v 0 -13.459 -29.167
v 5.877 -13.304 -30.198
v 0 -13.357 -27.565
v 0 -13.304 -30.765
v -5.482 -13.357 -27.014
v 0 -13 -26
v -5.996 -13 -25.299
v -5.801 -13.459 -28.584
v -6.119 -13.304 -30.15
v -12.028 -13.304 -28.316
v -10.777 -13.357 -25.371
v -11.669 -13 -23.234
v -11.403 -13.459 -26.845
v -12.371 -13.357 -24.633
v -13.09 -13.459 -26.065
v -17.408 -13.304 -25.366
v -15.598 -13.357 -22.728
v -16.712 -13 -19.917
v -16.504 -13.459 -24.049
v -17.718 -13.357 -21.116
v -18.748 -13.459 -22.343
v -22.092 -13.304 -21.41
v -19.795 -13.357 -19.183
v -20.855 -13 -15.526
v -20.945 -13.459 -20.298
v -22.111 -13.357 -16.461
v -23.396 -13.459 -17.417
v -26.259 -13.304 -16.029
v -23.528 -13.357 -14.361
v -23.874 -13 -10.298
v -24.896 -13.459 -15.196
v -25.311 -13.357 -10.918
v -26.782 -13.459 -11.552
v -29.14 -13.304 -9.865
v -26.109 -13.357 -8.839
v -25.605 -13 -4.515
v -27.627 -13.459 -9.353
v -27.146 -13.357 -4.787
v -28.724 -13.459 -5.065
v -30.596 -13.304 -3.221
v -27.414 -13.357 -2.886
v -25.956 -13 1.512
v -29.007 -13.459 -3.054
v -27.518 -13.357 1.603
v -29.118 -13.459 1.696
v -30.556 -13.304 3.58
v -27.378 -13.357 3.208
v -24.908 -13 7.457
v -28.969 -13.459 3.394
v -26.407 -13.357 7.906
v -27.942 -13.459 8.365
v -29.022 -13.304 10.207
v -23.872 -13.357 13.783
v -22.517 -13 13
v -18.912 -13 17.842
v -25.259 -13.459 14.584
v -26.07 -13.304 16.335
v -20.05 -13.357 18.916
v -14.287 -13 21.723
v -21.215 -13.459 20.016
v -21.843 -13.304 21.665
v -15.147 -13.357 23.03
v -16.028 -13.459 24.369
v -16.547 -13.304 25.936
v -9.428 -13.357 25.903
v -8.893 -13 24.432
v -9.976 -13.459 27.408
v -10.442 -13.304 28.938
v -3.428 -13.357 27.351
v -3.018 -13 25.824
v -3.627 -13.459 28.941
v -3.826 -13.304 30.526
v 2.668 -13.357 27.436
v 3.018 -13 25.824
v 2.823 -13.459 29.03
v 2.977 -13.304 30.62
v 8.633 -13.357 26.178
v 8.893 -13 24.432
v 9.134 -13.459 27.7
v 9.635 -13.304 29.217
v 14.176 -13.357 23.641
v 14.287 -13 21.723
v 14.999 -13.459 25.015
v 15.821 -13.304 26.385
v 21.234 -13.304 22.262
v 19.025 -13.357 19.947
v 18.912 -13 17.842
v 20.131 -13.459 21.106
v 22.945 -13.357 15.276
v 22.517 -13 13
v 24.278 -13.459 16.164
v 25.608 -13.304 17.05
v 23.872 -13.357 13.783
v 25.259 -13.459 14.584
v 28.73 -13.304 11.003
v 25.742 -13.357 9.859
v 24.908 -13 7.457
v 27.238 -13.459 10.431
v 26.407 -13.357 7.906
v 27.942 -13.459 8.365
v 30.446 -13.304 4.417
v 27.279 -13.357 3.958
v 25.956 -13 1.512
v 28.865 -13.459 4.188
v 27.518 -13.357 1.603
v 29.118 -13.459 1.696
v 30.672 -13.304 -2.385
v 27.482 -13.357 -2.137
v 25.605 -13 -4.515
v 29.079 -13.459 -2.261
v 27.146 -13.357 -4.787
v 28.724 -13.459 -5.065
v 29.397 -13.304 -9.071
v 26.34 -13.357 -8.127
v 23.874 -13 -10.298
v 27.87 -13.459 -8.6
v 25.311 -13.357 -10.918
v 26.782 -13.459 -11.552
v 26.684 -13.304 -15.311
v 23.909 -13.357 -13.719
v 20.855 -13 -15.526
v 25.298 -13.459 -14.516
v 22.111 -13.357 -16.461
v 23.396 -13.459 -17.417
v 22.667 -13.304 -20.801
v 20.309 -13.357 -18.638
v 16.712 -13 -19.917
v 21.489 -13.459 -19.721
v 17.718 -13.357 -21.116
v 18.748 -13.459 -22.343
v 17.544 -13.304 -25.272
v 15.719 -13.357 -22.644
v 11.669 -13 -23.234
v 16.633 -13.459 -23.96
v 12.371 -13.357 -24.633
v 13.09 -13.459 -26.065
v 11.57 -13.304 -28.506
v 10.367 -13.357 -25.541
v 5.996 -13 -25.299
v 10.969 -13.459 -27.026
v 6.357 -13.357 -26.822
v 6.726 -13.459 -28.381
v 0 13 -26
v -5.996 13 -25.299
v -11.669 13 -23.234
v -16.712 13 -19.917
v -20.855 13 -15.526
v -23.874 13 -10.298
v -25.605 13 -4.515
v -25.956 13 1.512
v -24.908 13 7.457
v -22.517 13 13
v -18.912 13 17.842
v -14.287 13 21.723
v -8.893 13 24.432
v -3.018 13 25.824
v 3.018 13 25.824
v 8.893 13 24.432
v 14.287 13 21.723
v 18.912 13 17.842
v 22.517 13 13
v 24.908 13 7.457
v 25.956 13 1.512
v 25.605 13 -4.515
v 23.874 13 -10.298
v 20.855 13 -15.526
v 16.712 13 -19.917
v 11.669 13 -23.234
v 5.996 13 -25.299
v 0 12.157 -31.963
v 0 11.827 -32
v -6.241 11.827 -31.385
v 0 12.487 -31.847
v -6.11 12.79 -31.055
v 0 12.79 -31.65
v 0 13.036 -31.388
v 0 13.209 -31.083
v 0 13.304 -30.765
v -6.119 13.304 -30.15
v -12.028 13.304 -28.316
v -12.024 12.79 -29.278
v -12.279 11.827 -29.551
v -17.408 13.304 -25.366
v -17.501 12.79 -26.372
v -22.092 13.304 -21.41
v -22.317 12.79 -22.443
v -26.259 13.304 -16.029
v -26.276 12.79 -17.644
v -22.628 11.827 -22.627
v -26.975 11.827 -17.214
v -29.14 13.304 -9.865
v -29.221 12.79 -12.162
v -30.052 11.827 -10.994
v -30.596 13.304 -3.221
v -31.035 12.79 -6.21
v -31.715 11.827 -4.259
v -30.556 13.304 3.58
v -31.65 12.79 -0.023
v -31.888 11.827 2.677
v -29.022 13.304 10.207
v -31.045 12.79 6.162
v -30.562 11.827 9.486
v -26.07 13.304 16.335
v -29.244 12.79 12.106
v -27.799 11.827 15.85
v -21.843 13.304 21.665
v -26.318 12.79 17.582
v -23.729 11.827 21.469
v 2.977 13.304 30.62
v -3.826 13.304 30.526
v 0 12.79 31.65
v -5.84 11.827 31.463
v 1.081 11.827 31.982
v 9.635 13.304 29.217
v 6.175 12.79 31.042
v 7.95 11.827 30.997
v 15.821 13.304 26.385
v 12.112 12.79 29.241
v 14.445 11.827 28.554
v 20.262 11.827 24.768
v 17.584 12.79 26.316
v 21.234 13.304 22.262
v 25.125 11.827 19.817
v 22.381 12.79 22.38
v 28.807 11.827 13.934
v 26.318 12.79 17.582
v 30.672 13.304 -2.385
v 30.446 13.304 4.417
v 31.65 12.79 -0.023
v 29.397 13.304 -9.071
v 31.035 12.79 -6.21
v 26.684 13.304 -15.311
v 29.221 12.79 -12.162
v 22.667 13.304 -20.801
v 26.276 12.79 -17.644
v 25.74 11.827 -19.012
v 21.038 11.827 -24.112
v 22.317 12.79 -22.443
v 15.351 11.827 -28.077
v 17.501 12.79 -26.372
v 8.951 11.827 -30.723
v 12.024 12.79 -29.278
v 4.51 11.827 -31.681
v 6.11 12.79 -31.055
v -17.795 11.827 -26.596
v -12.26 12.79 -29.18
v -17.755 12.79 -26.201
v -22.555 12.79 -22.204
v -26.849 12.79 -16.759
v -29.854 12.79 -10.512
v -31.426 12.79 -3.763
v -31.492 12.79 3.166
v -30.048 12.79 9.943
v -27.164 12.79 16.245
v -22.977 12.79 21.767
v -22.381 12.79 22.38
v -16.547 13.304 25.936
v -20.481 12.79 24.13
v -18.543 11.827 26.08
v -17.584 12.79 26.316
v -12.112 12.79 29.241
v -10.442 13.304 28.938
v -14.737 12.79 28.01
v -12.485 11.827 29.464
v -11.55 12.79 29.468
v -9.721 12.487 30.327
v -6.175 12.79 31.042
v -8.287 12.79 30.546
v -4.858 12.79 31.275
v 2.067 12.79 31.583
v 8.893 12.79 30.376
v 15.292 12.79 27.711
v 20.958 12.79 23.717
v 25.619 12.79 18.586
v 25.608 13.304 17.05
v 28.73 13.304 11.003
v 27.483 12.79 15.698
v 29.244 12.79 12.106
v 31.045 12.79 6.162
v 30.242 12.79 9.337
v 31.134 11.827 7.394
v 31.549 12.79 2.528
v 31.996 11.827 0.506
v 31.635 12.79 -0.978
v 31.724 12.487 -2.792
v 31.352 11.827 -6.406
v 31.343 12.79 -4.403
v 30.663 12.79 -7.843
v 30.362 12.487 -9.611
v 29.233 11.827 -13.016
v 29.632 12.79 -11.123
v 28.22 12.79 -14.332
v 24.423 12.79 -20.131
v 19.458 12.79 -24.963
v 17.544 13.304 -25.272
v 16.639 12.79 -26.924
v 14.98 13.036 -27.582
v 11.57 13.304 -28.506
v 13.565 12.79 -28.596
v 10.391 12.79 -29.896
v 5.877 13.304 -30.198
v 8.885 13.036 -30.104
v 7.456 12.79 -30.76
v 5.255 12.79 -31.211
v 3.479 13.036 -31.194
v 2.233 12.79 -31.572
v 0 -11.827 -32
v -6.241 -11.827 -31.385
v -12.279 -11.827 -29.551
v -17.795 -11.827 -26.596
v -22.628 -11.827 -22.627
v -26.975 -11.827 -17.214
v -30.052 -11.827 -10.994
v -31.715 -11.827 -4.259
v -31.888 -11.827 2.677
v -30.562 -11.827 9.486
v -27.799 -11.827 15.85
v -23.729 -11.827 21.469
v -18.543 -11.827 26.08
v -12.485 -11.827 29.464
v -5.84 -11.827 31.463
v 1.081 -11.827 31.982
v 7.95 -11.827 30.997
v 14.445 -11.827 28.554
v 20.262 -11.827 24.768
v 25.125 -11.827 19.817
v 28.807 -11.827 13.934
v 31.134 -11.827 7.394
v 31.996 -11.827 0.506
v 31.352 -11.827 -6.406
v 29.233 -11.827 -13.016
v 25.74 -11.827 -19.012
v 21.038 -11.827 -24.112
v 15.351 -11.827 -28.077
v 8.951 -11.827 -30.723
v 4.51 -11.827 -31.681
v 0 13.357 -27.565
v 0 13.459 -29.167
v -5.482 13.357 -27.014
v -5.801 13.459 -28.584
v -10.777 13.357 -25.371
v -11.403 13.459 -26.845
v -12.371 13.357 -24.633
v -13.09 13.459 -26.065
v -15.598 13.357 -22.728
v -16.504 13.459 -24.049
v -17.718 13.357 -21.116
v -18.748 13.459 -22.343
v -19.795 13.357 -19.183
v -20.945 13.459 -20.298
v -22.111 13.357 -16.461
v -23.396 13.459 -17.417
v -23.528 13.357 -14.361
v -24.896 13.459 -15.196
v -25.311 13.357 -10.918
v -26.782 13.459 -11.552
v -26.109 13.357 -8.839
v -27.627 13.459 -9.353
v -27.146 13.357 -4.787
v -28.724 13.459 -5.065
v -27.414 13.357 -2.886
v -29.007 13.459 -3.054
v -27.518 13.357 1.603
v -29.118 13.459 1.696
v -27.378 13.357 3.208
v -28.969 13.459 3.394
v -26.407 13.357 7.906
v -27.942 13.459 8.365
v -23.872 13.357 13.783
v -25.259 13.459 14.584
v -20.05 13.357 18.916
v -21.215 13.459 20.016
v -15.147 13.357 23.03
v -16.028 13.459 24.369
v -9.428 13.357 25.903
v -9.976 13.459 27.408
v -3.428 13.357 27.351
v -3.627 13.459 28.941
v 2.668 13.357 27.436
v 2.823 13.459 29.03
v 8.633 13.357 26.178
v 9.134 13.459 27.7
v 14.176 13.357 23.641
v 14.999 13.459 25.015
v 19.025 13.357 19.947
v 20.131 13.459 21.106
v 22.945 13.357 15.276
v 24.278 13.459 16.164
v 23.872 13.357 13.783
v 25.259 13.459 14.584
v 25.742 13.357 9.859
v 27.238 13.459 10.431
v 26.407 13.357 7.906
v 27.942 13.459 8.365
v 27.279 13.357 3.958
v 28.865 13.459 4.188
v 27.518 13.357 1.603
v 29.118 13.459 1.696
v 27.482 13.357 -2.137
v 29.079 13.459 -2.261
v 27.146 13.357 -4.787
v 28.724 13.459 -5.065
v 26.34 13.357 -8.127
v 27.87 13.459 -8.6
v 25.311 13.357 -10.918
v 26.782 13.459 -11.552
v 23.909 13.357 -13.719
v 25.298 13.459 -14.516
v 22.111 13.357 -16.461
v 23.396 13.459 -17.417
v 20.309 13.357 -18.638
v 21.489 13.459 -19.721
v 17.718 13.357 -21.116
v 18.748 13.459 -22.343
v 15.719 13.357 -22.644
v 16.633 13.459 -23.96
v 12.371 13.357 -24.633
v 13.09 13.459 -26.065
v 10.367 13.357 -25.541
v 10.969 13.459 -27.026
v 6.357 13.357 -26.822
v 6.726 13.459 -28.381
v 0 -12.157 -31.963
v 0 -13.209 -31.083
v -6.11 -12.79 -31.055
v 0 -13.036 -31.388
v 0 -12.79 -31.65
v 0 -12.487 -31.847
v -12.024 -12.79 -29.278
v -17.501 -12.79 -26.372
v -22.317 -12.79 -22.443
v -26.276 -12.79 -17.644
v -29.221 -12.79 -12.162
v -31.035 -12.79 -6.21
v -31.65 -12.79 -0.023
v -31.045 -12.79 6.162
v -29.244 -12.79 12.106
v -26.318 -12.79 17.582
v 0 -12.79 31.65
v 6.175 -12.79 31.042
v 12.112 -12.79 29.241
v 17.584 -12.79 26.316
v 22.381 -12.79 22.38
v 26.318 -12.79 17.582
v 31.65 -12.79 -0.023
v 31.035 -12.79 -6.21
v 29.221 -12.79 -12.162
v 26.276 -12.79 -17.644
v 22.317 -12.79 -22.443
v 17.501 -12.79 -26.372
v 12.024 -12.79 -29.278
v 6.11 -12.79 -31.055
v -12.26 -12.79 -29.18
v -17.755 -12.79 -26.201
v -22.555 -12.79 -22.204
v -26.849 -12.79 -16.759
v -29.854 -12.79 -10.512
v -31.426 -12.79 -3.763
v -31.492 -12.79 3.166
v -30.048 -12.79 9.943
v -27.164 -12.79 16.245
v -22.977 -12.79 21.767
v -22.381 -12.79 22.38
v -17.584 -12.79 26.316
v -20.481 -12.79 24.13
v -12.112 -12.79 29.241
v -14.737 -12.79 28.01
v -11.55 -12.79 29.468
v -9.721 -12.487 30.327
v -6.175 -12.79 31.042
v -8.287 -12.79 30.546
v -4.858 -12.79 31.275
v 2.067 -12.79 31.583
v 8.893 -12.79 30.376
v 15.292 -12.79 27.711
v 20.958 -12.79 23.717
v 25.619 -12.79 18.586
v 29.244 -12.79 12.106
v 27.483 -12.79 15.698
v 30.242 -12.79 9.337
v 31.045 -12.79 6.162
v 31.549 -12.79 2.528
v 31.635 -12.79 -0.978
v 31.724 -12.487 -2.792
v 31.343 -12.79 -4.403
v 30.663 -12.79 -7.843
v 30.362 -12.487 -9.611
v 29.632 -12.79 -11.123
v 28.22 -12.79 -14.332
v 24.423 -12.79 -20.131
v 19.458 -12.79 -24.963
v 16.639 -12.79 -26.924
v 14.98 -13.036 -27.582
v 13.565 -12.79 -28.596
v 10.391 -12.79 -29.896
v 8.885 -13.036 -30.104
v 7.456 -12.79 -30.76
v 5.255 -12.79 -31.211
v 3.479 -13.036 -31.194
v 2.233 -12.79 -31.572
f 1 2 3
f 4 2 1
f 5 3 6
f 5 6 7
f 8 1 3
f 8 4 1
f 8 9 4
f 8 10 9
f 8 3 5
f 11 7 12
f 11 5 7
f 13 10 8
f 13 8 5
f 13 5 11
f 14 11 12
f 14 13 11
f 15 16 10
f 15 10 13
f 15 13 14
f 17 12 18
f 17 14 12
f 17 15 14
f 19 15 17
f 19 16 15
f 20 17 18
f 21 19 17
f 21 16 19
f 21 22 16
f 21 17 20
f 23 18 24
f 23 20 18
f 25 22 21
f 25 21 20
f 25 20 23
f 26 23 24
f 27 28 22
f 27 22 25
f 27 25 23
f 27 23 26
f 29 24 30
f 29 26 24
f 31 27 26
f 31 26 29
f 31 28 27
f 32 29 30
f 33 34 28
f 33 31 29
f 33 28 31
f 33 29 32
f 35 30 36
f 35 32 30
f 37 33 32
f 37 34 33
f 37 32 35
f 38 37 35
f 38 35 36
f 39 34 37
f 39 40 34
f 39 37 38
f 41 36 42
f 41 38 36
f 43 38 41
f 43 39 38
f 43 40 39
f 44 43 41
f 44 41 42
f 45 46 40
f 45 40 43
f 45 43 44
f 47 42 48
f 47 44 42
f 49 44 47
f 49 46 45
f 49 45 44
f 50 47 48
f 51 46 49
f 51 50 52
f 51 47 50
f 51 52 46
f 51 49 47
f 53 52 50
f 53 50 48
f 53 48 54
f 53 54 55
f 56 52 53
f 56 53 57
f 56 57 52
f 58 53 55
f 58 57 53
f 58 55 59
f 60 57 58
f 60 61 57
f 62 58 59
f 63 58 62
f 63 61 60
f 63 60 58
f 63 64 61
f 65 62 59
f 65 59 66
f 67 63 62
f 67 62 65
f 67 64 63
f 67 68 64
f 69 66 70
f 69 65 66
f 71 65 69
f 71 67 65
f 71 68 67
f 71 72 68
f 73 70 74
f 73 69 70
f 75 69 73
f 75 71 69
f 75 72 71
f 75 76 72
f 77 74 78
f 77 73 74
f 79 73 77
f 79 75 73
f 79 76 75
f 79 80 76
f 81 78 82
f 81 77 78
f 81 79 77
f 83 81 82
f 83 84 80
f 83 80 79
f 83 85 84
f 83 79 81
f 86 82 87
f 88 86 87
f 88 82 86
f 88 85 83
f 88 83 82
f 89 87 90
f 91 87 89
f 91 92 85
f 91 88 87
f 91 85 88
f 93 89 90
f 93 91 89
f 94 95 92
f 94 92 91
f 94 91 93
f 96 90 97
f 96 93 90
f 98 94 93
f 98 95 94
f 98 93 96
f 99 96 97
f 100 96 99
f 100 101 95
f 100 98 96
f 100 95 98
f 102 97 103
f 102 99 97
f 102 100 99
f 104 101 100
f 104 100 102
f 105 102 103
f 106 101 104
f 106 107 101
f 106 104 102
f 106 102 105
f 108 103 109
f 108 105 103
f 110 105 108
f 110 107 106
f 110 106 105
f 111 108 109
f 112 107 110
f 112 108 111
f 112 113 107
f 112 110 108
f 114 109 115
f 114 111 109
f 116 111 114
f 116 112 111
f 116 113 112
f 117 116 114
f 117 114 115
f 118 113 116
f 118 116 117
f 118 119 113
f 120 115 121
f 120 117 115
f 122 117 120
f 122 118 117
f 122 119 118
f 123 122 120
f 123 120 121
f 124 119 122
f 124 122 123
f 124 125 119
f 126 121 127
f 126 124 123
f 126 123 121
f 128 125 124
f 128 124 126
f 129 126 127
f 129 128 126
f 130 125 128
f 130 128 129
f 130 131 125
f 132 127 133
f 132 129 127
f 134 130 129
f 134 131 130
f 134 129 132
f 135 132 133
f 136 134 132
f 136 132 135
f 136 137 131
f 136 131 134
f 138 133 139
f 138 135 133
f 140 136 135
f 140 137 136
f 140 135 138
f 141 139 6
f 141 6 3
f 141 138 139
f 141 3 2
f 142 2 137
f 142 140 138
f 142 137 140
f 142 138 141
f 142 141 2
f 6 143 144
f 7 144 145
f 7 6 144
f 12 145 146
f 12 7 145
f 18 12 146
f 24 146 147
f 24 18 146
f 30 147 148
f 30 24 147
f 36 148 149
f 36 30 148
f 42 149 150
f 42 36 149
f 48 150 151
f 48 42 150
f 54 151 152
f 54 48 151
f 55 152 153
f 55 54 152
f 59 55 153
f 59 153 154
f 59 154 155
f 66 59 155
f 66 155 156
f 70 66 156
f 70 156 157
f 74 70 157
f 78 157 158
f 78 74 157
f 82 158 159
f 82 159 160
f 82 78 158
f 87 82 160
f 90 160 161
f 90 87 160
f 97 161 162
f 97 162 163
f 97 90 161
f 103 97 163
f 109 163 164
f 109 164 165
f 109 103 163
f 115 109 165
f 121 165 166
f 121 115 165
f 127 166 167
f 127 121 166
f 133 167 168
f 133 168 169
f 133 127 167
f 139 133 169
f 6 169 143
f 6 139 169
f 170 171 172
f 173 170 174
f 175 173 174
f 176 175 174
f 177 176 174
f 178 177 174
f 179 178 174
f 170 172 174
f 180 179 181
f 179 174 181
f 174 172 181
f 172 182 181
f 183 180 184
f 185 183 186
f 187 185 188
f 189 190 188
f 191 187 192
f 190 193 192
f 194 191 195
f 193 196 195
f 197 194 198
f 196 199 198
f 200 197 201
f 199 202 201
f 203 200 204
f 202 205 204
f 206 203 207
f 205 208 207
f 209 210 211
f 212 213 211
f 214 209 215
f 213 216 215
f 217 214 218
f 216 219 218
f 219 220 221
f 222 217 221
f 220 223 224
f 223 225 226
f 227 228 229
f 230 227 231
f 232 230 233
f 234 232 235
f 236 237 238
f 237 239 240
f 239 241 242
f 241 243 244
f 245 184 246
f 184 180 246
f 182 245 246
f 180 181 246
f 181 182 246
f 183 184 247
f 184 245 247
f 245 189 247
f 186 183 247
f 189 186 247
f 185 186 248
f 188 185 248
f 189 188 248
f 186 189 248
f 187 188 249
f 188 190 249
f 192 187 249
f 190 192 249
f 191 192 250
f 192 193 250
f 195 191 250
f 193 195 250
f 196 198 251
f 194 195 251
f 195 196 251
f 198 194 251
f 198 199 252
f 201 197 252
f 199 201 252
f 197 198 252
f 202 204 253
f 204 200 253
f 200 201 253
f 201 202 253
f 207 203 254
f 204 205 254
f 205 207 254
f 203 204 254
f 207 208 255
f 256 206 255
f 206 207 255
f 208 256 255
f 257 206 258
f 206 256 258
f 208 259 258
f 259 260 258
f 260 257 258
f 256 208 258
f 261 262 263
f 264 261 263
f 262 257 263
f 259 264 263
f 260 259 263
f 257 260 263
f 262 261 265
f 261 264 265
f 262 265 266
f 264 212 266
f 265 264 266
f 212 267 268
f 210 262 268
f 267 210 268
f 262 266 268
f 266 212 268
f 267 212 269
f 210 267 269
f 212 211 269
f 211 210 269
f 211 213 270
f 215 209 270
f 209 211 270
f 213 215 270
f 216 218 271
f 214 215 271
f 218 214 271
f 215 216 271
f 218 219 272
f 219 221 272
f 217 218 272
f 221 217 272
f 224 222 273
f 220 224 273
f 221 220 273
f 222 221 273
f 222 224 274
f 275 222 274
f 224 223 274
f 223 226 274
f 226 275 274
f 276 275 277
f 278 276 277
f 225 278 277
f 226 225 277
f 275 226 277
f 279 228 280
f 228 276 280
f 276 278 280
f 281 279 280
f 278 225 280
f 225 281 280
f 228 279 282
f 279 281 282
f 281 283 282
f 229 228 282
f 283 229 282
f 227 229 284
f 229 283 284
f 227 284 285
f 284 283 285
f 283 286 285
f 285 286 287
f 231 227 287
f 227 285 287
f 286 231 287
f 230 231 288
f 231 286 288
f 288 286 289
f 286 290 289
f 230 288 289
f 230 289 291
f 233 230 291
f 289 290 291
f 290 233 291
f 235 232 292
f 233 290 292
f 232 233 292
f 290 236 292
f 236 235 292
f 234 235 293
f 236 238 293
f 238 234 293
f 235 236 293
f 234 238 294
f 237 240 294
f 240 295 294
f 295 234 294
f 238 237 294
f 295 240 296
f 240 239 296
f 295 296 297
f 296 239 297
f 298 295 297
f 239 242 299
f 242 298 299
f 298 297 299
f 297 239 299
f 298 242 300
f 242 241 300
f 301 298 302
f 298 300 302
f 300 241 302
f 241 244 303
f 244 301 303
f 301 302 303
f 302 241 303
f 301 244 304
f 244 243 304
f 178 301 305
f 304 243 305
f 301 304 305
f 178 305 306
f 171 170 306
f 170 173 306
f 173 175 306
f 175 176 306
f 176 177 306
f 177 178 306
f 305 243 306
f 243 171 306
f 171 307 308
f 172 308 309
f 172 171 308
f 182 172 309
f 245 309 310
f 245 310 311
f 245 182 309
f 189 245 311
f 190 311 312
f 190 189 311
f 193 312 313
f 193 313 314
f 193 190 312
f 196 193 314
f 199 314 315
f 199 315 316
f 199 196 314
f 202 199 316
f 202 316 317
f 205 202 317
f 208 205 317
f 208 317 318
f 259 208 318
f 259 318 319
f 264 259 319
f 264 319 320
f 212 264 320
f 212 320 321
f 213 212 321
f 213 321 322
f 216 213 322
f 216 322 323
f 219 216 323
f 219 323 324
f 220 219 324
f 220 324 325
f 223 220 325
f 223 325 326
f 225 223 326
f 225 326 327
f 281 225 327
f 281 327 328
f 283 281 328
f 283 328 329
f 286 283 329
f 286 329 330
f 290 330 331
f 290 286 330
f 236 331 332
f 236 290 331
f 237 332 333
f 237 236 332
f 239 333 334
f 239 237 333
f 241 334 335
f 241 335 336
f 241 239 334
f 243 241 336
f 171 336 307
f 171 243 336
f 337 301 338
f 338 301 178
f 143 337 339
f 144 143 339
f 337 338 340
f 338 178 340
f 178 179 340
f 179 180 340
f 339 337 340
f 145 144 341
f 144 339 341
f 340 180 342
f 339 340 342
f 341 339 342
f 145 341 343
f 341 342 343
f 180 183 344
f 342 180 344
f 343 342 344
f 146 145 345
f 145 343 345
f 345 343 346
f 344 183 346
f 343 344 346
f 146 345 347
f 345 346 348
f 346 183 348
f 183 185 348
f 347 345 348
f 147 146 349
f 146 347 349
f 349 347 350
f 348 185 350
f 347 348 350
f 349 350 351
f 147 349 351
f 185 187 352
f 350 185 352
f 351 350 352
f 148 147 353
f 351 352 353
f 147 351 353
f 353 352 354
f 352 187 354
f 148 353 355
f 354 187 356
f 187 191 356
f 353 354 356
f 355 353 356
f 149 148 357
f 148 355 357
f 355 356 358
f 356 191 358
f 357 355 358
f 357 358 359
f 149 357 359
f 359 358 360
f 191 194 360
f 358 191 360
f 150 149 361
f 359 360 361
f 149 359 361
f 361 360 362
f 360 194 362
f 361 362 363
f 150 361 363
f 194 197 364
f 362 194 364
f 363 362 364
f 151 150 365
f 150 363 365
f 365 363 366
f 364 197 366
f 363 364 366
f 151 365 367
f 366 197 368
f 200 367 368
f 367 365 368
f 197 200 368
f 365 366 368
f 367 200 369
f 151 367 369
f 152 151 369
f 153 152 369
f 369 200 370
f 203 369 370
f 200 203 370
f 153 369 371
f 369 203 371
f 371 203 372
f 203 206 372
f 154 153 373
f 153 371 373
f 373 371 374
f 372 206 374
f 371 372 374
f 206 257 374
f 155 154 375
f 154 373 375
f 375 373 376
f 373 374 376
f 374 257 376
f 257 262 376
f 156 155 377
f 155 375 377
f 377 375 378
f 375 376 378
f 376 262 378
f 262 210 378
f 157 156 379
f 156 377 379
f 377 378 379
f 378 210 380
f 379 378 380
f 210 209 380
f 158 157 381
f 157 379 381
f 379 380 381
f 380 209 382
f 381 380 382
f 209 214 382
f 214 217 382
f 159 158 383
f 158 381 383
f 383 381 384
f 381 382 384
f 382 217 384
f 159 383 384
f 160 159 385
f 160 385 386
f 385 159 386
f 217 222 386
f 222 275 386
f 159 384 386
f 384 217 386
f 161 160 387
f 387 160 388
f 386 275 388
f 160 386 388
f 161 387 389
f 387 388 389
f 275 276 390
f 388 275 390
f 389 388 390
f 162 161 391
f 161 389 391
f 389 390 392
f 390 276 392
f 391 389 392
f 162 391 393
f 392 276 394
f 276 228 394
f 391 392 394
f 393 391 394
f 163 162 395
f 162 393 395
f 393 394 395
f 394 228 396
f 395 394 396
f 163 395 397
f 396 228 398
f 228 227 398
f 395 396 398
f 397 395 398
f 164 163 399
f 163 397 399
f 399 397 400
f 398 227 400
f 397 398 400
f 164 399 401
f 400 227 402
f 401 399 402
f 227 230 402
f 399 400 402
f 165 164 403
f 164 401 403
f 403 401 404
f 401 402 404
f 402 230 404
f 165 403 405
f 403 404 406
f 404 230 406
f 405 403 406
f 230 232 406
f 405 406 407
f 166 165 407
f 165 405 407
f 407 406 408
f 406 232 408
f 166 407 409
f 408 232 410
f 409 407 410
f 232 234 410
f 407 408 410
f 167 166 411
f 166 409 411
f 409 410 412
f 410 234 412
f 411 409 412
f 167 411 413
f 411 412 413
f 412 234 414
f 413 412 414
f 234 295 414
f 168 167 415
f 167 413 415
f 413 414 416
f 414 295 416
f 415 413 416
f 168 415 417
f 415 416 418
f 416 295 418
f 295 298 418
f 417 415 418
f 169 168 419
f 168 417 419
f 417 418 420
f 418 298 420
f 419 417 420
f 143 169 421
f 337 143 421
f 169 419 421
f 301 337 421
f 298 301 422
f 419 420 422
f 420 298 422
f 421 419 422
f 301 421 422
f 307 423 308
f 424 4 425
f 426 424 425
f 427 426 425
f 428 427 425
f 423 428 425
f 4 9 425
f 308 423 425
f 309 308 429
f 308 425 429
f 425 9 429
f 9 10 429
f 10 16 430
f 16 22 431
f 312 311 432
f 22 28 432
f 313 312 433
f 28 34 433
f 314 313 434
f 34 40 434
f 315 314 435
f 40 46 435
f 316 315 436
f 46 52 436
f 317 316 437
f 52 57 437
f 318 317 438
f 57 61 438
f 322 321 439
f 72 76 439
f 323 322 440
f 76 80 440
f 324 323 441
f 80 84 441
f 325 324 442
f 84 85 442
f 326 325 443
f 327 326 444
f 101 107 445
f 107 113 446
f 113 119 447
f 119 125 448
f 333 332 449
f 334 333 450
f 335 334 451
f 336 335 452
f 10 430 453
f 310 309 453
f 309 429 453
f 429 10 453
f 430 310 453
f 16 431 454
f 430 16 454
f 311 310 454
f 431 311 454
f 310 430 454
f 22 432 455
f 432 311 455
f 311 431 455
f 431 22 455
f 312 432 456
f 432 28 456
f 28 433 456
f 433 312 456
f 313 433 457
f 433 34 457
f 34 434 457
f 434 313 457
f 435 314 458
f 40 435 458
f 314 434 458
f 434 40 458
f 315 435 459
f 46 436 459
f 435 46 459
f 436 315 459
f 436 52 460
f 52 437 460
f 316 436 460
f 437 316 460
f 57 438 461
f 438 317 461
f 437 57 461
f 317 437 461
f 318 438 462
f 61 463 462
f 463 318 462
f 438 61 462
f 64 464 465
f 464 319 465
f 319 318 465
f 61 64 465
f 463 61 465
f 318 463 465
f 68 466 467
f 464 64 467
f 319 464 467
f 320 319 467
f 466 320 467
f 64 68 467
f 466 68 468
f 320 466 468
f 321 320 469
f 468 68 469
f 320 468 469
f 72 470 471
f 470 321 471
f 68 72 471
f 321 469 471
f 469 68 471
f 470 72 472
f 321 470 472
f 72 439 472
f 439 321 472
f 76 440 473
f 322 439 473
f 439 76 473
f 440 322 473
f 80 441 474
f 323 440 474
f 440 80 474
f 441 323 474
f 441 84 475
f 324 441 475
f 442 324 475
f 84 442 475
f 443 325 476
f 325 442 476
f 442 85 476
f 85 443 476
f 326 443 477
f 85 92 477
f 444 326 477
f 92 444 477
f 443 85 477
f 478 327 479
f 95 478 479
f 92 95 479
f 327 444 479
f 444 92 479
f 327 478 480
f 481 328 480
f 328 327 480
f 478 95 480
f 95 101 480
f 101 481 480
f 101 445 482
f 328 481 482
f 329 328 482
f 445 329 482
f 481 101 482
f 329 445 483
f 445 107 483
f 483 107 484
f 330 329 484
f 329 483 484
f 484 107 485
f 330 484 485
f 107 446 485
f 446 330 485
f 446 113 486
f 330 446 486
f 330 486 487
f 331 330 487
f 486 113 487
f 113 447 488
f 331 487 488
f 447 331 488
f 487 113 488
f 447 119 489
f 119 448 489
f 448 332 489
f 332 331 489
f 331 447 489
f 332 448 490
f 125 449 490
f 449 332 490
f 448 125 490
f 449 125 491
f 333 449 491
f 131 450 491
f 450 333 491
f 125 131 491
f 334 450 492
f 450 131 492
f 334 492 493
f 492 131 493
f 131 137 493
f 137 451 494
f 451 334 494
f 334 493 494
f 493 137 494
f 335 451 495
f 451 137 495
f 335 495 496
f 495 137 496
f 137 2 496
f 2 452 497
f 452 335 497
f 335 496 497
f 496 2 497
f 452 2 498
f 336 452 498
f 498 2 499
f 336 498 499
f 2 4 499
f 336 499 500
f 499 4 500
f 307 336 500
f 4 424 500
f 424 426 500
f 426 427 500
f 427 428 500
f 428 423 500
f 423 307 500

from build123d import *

# Parameters (mm, degrees)
SKETCH_1_R      = 32
SKETCH_1_R_2    = 26
EXTRUDE_1_DEPTH = 13
FILLET_1_R      = 1.5


with BuildPart() as part:
    # 草图1 → 凸台-拉伸1 (new, symmetric)
    with BuildSketch(Plane(origin=(0, 0, 0), x_dir=(1, 0, 0), z_dir=(0, 1, 0))):
        with Locations(Location((0, 0, 0), (0, 0, 90))):
            Circle(SKETCH_1_R)
        with Locations(Location((0, 0, 0), (0, 0, 90))):
            Circle(SKETCH_1_R_2, mode=Mode.SUBTRACT)
    extrude(amount=EXTRUDE_1_DEPTH, both=True)

    # 草图2 → 旋转1 (revolve)
    with BuildSketch(Plane.XY, mode=Mode.PRIVATE) as revolve_1_sk:
        with BuildLine():
            Line((-32, 13), (-26, 13))
            ThreePointArc((-26, 13), (-29, 13.460607986), (-32, 13))
        make_face()
    revolve_1 = revolve(revolve_1_sk.sketch.rotate(Axis((0, 0, 0), (0, 1, 0)), 270), axis=Axis((0, 0, 0), (0, 1, 0)))

    # 镜向1: 旋转1 across plane
    add(revolve_1.mirror(Plane.ZX))

    # 圆角1
    fillet_1_edges = [part.edges().sort_by_distance(p)[0] for p in [
        (0, -13, 32),
        (0, 13, 32),
    ]]
    fillet(fillet_1_edges, radius=FILLET_1_R)


solid = part.part
